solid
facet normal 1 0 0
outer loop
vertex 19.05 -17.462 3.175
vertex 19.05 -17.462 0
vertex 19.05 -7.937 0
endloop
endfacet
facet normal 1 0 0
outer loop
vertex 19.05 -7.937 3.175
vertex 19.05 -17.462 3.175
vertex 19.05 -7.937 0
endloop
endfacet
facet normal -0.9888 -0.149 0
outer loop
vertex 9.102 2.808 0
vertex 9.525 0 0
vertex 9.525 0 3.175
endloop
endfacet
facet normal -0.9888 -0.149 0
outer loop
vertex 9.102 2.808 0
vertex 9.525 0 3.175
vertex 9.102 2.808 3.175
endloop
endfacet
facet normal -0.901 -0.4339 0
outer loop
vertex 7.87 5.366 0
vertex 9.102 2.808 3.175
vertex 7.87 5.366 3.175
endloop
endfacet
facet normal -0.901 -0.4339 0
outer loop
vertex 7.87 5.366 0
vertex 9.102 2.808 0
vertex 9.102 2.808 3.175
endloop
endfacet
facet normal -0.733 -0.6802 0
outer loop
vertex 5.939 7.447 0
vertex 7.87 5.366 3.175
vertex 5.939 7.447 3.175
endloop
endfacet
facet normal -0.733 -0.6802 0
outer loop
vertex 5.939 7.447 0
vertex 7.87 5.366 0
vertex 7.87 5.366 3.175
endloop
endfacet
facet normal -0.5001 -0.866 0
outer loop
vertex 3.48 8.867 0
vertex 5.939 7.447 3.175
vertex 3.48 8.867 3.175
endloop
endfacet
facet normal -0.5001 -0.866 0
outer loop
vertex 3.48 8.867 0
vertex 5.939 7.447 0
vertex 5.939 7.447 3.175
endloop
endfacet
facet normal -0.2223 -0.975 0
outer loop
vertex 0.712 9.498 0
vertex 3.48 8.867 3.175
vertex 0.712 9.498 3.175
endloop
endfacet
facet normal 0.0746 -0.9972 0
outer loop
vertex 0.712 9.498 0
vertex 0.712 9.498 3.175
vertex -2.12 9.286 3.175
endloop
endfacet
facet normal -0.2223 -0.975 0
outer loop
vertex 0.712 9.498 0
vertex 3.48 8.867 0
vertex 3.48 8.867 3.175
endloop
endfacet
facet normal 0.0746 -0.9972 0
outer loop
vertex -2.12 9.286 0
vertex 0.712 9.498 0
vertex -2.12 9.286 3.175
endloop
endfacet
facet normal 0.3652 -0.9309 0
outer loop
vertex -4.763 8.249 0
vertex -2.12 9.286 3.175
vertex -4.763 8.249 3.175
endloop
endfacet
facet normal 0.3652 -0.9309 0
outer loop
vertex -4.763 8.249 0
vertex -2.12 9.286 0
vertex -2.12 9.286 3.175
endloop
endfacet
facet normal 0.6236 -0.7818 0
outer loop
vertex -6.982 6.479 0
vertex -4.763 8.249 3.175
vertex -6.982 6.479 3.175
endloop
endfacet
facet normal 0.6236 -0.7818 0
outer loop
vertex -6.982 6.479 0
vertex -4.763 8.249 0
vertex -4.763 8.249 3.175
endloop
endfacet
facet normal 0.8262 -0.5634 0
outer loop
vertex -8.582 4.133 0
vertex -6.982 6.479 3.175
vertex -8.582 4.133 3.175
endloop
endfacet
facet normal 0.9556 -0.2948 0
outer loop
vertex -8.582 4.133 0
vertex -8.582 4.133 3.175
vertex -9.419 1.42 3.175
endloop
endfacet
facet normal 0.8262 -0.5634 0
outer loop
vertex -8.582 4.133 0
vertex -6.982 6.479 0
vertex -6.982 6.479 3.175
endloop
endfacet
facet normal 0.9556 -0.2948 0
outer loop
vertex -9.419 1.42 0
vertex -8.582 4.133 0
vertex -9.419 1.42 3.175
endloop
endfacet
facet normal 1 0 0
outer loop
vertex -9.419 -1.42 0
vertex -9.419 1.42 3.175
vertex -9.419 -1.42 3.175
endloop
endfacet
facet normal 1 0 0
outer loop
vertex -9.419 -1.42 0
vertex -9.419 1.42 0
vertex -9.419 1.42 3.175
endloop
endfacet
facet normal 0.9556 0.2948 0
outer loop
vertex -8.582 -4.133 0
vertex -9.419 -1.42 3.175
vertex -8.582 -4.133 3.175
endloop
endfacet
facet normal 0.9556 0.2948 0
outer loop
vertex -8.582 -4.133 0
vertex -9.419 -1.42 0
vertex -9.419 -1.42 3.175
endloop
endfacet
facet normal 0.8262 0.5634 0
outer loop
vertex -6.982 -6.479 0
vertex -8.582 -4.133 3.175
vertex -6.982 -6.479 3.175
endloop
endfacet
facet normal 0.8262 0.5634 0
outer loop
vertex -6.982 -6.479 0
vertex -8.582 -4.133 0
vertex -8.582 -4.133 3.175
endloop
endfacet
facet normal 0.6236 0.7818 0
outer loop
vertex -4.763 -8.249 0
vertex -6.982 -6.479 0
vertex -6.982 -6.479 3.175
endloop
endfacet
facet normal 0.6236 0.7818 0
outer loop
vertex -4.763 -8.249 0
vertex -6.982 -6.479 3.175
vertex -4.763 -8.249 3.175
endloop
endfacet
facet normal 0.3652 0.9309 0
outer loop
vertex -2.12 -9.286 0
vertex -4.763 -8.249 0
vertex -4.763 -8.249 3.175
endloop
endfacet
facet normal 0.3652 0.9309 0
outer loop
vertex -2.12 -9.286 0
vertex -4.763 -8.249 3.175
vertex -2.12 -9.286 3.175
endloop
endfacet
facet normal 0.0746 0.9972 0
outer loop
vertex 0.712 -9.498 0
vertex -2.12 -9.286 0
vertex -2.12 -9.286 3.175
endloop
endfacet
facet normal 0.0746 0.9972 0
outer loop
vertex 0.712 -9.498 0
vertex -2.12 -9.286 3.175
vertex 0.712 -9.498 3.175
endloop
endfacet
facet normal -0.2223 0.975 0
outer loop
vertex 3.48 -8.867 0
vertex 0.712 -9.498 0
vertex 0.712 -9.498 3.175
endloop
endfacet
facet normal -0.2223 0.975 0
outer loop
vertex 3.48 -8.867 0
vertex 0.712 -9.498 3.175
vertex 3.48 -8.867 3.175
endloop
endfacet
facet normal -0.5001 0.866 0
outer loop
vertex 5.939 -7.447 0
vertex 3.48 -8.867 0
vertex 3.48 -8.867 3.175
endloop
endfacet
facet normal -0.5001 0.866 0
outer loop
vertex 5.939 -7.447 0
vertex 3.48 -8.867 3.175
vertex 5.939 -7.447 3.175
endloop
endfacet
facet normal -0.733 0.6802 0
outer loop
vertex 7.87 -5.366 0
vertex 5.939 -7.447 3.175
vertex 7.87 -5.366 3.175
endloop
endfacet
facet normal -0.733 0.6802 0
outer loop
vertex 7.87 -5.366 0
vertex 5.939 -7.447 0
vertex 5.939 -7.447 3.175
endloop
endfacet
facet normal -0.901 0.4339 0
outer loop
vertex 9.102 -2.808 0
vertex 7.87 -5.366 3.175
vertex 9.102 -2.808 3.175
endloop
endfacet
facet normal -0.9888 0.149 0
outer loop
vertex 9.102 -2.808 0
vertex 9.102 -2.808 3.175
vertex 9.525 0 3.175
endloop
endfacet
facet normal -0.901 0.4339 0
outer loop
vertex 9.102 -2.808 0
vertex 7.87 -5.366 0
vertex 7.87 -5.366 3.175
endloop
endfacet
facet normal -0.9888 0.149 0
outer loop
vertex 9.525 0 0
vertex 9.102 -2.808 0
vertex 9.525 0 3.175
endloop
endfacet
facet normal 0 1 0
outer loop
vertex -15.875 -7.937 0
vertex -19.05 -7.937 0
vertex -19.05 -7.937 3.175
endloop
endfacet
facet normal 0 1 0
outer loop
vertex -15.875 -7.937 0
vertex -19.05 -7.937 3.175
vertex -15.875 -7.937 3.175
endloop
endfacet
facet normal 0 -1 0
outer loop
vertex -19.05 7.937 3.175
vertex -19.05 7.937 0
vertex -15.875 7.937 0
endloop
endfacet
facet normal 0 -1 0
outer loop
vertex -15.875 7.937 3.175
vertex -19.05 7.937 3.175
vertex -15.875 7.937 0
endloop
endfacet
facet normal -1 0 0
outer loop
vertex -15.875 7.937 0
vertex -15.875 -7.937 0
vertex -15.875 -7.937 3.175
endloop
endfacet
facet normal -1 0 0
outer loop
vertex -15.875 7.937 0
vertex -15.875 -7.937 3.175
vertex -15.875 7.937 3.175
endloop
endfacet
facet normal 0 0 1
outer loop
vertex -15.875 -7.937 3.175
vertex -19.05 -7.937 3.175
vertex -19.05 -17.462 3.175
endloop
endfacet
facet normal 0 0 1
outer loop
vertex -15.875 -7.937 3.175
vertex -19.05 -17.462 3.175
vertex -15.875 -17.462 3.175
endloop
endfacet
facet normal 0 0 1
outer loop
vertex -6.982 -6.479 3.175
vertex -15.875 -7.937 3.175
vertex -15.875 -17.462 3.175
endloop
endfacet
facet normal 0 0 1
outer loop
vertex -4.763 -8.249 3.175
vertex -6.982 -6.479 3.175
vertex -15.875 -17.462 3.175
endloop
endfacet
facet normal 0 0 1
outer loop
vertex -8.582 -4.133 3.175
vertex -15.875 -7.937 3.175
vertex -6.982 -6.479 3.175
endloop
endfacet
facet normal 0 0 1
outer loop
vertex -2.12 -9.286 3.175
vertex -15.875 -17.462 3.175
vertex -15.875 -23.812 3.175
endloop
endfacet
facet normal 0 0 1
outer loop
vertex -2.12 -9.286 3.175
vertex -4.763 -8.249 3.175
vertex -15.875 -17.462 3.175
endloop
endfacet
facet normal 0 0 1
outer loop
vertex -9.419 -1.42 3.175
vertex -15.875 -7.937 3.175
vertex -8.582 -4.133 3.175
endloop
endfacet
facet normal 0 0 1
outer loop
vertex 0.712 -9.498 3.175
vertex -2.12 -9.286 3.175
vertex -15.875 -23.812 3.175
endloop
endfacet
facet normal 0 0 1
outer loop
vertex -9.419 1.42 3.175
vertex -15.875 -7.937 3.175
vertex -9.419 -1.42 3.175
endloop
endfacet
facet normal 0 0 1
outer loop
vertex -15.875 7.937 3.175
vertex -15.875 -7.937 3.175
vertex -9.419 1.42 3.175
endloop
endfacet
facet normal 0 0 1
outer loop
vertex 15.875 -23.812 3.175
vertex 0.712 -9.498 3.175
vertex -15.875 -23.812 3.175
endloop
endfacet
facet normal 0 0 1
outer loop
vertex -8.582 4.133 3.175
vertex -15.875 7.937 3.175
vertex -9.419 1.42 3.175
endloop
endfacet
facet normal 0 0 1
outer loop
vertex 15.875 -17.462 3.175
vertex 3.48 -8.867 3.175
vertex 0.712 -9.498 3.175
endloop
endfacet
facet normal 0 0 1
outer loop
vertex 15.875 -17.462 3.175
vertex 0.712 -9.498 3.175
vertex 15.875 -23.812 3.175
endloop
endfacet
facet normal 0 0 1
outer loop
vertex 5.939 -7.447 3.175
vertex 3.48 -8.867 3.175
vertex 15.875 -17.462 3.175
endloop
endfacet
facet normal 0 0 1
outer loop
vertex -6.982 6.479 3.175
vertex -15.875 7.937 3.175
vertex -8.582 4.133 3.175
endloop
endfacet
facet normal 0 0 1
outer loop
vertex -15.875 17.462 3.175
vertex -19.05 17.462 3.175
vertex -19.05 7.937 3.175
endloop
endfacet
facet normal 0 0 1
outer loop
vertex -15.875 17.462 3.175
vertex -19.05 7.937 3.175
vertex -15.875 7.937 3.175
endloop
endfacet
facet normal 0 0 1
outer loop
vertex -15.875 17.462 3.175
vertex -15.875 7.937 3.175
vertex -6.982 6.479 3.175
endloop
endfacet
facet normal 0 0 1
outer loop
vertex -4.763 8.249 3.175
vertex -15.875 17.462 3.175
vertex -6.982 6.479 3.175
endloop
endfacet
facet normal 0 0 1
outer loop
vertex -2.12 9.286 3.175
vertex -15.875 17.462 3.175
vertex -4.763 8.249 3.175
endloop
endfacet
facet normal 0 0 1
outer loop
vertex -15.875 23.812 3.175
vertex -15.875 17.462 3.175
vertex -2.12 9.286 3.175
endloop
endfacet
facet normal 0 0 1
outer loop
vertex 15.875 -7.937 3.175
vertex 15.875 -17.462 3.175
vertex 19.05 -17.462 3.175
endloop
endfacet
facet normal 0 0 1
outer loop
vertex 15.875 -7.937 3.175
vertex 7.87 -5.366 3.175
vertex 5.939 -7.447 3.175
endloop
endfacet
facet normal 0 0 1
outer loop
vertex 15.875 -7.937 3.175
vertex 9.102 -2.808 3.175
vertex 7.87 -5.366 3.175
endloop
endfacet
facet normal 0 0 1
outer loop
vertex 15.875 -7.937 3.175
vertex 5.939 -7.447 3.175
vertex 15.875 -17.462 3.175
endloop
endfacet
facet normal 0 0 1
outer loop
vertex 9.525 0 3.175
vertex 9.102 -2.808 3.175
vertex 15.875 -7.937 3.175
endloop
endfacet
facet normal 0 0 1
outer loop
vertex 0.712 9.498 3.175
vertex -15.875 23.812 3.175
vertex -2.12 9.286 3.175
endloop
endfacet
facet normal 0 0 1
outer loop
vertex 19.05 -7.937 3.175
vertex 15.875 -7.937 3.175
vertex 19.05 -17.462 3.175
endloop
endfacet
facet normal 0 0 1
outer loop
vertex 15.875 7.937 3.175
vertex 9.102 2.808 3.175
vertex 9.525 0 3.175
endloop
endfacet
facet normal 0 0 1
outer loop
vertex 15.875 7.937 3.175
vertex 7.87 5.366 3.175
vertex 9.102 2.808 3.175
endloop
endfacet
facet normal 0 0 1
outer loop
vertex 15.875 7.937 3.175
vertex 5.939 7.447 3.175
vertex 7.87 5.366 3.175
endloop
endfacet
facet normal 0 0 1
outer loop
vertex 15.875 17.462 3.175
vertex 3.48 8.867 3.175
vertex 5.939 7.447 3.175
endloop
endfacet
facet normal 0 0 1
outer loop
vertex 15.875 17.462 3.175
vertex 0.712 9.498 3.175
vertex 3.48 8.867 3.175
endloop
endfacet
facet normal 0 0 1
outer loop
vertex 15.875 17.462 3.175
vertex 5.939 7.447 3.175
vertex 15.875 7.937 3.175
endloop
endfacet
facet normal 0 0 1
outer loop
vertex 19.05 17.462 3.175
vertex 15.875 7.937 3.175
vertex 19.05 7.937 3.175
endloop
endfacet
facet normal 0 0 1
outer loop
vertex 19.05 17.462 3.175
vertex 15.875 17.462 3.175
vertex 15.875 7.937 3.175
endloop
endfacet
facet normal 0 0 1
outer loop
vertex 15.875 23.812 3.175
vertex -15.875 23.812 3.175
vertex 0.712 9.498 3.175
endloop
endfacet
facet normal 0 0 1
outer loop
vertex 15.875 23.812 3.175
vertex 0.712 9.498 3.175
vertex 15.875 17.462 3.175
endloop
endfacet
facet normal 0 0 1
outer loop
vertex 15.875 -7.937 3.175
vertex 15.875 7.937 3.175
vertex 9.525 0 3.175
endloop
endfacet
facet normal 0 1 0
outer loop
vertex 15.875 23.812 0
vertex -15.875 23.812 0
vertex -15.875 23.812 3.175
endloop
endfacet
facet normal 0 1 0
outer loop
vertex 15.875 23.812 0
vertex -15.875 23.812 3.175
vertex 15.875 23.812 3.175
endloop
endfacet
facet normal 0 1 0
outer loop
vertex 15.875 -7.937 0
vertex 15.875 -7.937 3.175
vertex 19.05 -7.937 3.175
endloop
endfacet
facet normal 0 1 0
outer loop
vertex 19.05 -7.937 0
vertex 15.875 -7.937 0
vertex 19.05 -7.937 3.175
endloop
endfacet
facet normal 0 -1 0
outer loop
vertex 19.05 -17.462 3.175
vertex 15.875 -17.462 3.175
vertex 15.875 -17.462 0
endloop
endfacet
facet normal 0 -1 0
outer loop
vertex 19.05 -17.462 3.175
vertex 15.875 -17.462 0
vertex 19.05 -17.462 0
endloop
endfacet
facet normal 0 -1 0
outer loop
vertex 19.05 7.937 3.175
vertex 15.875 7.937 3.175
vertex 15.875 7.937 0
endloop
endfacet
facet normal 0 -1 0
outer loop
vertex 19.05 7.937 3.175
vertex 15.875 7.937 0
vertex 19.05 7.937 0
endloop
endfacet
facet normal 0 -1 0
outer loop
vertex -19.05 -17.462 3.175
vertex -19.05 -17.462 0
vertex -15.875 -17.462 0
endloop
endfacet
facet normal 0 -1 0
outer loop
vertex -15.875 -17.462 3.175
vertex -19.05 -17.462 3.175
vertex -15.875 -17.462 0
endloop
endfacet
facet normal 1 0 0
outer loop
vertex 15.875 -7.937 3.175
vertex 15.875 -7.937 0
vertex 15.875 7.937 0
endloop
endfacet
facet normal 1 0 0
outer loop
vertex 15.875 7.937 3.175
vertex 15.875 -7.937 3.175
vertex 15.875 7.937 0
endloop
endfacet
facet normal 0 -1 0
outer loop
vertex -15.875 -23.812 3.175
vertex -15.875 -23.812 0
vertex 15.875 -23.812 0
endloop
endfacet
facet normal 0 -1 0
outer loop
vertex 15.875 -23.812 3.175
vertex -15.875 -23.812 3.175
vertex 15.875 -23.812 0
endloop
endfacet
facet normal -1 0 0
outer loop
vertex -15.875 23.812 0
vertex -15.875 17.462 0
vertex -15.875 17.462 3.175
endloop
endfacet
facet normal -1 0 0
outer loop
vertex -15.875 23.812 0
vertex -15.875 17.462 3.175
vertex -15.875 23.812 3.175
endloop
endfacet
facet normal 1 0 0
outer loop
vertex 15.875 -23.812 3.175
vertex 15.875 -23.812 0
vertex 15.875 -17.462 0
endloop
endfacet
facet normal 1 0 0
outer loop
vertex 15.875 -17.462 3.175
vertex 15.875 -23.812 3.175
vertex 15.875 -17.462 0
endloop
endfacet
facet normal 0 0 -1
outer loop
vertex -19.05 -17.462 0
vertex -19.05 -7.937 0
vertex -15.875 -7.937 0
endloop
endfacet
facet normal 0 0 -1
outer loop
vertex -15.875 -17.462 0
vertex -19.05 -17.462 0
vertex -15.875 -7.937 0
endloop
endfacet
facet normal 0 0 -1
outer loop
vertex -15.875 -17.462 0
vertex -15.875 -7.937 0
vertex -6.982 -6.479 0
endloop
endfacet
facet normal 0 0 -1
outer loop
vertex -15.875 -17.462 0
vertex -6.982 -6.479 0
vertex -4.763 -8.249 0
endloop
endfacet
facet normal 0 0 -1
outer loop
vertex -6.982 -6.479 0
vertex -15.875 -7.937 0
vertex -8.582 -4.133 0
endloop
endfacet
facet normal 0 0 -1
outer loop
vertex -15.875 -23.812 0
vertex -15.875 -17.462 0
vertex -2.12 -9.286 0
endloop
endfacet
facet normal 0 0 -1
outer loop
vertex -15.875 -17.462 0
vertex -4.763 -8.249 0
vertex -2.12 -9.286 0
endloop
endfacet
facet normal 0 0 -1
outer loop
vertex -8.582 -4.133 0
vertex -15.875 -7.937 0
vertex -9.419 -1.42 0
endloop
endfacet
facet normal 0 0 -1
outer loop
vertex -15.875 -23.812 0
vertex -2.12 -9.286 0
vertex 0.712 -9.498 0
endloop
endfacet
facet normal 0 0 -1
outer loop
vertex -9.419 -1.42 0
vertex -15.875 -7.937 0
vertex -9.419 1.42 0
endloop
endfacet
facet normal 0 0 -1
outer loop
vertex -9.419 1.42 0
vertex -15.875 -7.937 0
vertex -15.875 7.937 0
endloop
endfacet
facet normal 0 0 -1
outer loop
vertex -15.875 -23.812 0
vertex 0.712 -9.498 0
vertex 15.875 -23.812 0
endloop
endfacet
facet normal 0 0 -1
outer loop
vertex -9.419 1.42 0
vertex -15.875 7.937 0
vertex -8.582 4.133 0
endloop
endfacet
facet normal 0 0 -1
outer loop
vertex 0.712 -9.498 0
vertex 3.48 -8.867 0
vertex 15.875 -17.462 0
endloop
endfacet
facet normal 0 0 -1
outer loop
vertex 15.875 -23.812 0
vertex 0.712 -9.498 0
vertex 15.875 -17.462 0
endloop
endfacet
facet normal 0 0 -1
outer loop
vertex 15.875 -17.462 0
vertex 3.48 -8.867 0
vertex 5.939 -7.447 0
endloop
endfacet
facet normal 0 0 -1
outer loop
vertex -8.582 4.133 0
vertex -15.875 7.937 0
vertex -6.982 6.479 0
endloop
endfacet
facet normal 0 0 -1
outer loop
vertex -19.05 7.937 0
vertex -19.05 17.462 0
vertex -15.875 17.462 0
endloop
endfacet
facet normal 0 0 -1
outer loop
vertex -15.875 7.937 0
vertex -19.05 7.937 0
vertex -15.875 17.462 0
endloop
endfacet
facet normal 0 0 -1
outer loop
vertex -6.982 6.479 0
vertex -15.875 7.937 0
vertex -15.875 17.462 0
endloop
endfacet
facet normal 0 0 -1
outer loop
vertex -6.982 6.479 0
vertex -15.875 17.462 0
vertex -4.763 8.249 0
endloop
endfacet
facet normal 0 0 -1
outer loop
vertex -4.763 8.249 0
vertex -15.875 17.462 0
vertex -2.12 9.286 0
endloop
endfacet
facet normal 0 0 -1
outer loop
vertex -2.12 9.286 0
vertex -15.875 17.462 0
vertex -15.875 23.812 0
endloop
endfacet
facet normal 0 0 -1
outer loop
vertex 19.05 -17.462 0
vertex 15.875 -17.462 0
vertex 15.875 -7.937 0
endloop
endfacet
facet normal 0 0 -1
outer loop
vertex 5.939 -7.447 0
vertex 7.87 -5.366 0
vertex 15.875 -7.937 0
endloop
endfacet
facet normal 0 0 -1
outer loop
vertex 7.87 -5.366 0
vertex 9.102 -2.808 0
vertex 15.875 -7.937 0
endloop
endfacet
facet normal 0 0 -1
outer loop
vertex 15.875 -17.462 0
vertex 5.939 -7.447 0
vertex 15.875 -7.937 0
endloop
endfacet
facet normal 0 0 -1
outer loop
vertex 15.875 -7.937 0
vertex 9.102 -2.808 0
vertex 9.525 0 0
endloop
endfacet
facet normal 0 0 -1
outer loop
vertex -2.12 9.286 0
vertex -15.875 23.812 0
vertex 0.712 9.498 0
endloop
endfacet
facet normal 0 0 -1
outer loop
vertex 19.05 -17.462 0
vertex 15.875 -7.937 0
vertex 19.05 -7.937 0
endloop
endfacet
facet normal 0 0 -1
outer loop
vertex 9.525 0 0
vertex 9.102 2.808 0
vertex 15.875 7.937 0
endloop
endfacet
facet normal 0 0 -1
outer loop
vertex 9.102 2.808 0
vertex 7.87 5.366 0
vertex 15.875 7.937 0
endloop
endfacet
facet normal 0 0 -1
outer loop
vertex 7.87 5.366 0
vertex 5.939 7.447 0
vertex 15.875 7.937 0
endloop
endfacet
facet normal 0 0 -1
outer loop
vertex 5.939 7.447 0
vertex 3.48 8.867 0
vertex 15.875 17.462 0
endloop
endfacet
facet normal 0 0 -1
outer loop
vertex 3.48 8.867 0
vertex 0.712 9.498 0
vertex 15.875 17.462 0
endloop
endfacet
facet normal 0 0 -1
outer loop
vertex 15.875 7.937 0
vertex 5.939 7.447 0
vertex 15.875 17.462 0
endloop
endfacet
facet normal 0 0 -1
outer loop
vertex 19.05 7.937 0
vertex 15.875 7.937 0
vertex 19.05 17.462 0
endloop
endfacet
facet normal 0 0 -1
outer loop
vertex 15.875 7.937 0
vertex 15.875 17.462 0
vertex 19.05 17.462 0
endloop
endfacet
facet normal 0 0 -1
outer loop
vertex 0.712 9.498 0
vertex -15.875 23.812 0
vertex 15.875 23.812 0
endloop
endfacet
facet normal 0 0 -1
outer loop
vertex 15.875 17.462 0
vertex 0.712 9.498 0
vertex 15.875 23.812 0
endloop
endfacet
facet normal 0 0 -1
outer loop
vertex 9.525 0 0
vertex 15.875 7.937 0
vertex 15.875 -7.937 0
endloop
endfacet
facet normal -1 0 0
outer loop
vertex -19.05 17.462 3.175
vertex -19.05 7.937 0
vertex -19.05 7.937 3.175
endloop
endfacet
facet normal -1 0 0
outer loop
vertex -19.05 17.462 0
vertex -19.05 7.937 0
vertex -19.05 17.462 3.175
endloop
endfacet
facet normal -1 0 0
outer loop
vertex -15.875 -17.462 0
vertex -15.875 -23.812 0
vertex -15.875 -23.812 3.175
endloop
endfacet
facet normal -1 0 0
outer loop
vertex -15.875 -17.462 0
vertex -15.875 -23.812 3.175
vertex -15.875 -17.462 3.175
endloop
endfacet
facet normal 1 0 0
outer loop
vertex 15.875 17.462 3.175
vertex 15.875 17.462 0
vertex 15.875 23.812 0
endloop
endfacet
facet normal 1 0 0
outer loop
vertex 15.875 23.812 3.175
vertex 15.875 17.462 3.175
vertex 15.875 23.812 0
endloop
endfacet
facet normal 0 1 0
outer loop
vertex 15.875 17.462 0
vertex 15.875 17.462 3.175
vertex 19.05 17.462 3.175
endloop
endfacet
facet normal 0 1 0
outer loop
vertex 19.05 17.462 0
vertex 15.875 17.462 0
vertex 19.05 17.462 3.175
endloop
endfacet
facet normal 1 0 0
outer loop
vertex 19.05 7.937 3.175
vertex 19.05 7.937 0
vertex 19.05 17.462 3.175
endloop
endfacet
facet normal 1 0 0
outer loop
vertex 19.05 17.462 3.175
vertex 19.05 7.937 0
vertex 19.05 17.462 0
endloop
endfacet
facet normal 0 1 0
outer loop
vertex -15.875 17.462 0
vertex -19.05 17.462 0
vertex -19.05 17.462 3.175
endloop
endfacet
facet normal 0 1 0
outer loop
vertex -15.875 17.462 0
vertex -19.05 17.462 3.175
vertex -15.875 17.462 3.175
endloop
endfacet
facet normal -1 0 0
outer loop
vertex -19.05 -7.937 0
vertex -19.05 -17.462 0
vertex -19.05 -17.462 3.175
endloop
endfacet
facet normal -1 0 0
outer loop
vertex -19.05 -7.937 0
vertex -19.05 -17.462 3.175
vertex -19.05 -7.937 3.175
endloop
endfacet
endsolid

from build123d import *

# Parameters (mm, degrees)
SKETCH1_W           = 3.175
SKETCH1_H           = 9.525
SKETCH1_W_2         = 31.75
SKETCH1_H_2         = 47.625
SKETCH1_R           = 9.525
BOSS_EXTRUDE1_DEPTH = 3.175


with BuildPart() as part:
    # Sketch1 → Boss-Extrude1 (new body)
    # profile 1 of 5: a face of its own
    with BuildSketch(Plane.XY):
        with Locations((-17.4625, 12.7)):
            Rectangle(SKETCH1_W, SKETCH1_H)
    # profile 2 of 5: a face of its own
    with BuildSketch(Plane.XY):
        Rectangle(SKETCH1_W_2, SKETCH1_H_2)
        Circle(SKETCH1_R, mode=Mode.SUBTRACT)
    # profile 3 of 5: a face of its own
    with BuildSketch(Plane.XY):
        with Locations((-17.4625, -12.7)):
            Rectangle(SKETCH1_W, SKETCH1_H)
    # profile 4 of 5: a face of its own
    with BuildSketch(Plane.XY):
        with Locations((17.4625, 12.7)):
            Rectangle(SKETCH1_W, SKETCH1_H)
    # profile 5 of 5: a face of its own
    with BuildSketch(Plane.XY):
        with Locations((17.4625, -12.7)):
            Rectangle(SKETCH1_W, SKETCH1_H)
    extrude(amount=BOSS_EXTRUDE1_DEPTH)


solid = part.part
